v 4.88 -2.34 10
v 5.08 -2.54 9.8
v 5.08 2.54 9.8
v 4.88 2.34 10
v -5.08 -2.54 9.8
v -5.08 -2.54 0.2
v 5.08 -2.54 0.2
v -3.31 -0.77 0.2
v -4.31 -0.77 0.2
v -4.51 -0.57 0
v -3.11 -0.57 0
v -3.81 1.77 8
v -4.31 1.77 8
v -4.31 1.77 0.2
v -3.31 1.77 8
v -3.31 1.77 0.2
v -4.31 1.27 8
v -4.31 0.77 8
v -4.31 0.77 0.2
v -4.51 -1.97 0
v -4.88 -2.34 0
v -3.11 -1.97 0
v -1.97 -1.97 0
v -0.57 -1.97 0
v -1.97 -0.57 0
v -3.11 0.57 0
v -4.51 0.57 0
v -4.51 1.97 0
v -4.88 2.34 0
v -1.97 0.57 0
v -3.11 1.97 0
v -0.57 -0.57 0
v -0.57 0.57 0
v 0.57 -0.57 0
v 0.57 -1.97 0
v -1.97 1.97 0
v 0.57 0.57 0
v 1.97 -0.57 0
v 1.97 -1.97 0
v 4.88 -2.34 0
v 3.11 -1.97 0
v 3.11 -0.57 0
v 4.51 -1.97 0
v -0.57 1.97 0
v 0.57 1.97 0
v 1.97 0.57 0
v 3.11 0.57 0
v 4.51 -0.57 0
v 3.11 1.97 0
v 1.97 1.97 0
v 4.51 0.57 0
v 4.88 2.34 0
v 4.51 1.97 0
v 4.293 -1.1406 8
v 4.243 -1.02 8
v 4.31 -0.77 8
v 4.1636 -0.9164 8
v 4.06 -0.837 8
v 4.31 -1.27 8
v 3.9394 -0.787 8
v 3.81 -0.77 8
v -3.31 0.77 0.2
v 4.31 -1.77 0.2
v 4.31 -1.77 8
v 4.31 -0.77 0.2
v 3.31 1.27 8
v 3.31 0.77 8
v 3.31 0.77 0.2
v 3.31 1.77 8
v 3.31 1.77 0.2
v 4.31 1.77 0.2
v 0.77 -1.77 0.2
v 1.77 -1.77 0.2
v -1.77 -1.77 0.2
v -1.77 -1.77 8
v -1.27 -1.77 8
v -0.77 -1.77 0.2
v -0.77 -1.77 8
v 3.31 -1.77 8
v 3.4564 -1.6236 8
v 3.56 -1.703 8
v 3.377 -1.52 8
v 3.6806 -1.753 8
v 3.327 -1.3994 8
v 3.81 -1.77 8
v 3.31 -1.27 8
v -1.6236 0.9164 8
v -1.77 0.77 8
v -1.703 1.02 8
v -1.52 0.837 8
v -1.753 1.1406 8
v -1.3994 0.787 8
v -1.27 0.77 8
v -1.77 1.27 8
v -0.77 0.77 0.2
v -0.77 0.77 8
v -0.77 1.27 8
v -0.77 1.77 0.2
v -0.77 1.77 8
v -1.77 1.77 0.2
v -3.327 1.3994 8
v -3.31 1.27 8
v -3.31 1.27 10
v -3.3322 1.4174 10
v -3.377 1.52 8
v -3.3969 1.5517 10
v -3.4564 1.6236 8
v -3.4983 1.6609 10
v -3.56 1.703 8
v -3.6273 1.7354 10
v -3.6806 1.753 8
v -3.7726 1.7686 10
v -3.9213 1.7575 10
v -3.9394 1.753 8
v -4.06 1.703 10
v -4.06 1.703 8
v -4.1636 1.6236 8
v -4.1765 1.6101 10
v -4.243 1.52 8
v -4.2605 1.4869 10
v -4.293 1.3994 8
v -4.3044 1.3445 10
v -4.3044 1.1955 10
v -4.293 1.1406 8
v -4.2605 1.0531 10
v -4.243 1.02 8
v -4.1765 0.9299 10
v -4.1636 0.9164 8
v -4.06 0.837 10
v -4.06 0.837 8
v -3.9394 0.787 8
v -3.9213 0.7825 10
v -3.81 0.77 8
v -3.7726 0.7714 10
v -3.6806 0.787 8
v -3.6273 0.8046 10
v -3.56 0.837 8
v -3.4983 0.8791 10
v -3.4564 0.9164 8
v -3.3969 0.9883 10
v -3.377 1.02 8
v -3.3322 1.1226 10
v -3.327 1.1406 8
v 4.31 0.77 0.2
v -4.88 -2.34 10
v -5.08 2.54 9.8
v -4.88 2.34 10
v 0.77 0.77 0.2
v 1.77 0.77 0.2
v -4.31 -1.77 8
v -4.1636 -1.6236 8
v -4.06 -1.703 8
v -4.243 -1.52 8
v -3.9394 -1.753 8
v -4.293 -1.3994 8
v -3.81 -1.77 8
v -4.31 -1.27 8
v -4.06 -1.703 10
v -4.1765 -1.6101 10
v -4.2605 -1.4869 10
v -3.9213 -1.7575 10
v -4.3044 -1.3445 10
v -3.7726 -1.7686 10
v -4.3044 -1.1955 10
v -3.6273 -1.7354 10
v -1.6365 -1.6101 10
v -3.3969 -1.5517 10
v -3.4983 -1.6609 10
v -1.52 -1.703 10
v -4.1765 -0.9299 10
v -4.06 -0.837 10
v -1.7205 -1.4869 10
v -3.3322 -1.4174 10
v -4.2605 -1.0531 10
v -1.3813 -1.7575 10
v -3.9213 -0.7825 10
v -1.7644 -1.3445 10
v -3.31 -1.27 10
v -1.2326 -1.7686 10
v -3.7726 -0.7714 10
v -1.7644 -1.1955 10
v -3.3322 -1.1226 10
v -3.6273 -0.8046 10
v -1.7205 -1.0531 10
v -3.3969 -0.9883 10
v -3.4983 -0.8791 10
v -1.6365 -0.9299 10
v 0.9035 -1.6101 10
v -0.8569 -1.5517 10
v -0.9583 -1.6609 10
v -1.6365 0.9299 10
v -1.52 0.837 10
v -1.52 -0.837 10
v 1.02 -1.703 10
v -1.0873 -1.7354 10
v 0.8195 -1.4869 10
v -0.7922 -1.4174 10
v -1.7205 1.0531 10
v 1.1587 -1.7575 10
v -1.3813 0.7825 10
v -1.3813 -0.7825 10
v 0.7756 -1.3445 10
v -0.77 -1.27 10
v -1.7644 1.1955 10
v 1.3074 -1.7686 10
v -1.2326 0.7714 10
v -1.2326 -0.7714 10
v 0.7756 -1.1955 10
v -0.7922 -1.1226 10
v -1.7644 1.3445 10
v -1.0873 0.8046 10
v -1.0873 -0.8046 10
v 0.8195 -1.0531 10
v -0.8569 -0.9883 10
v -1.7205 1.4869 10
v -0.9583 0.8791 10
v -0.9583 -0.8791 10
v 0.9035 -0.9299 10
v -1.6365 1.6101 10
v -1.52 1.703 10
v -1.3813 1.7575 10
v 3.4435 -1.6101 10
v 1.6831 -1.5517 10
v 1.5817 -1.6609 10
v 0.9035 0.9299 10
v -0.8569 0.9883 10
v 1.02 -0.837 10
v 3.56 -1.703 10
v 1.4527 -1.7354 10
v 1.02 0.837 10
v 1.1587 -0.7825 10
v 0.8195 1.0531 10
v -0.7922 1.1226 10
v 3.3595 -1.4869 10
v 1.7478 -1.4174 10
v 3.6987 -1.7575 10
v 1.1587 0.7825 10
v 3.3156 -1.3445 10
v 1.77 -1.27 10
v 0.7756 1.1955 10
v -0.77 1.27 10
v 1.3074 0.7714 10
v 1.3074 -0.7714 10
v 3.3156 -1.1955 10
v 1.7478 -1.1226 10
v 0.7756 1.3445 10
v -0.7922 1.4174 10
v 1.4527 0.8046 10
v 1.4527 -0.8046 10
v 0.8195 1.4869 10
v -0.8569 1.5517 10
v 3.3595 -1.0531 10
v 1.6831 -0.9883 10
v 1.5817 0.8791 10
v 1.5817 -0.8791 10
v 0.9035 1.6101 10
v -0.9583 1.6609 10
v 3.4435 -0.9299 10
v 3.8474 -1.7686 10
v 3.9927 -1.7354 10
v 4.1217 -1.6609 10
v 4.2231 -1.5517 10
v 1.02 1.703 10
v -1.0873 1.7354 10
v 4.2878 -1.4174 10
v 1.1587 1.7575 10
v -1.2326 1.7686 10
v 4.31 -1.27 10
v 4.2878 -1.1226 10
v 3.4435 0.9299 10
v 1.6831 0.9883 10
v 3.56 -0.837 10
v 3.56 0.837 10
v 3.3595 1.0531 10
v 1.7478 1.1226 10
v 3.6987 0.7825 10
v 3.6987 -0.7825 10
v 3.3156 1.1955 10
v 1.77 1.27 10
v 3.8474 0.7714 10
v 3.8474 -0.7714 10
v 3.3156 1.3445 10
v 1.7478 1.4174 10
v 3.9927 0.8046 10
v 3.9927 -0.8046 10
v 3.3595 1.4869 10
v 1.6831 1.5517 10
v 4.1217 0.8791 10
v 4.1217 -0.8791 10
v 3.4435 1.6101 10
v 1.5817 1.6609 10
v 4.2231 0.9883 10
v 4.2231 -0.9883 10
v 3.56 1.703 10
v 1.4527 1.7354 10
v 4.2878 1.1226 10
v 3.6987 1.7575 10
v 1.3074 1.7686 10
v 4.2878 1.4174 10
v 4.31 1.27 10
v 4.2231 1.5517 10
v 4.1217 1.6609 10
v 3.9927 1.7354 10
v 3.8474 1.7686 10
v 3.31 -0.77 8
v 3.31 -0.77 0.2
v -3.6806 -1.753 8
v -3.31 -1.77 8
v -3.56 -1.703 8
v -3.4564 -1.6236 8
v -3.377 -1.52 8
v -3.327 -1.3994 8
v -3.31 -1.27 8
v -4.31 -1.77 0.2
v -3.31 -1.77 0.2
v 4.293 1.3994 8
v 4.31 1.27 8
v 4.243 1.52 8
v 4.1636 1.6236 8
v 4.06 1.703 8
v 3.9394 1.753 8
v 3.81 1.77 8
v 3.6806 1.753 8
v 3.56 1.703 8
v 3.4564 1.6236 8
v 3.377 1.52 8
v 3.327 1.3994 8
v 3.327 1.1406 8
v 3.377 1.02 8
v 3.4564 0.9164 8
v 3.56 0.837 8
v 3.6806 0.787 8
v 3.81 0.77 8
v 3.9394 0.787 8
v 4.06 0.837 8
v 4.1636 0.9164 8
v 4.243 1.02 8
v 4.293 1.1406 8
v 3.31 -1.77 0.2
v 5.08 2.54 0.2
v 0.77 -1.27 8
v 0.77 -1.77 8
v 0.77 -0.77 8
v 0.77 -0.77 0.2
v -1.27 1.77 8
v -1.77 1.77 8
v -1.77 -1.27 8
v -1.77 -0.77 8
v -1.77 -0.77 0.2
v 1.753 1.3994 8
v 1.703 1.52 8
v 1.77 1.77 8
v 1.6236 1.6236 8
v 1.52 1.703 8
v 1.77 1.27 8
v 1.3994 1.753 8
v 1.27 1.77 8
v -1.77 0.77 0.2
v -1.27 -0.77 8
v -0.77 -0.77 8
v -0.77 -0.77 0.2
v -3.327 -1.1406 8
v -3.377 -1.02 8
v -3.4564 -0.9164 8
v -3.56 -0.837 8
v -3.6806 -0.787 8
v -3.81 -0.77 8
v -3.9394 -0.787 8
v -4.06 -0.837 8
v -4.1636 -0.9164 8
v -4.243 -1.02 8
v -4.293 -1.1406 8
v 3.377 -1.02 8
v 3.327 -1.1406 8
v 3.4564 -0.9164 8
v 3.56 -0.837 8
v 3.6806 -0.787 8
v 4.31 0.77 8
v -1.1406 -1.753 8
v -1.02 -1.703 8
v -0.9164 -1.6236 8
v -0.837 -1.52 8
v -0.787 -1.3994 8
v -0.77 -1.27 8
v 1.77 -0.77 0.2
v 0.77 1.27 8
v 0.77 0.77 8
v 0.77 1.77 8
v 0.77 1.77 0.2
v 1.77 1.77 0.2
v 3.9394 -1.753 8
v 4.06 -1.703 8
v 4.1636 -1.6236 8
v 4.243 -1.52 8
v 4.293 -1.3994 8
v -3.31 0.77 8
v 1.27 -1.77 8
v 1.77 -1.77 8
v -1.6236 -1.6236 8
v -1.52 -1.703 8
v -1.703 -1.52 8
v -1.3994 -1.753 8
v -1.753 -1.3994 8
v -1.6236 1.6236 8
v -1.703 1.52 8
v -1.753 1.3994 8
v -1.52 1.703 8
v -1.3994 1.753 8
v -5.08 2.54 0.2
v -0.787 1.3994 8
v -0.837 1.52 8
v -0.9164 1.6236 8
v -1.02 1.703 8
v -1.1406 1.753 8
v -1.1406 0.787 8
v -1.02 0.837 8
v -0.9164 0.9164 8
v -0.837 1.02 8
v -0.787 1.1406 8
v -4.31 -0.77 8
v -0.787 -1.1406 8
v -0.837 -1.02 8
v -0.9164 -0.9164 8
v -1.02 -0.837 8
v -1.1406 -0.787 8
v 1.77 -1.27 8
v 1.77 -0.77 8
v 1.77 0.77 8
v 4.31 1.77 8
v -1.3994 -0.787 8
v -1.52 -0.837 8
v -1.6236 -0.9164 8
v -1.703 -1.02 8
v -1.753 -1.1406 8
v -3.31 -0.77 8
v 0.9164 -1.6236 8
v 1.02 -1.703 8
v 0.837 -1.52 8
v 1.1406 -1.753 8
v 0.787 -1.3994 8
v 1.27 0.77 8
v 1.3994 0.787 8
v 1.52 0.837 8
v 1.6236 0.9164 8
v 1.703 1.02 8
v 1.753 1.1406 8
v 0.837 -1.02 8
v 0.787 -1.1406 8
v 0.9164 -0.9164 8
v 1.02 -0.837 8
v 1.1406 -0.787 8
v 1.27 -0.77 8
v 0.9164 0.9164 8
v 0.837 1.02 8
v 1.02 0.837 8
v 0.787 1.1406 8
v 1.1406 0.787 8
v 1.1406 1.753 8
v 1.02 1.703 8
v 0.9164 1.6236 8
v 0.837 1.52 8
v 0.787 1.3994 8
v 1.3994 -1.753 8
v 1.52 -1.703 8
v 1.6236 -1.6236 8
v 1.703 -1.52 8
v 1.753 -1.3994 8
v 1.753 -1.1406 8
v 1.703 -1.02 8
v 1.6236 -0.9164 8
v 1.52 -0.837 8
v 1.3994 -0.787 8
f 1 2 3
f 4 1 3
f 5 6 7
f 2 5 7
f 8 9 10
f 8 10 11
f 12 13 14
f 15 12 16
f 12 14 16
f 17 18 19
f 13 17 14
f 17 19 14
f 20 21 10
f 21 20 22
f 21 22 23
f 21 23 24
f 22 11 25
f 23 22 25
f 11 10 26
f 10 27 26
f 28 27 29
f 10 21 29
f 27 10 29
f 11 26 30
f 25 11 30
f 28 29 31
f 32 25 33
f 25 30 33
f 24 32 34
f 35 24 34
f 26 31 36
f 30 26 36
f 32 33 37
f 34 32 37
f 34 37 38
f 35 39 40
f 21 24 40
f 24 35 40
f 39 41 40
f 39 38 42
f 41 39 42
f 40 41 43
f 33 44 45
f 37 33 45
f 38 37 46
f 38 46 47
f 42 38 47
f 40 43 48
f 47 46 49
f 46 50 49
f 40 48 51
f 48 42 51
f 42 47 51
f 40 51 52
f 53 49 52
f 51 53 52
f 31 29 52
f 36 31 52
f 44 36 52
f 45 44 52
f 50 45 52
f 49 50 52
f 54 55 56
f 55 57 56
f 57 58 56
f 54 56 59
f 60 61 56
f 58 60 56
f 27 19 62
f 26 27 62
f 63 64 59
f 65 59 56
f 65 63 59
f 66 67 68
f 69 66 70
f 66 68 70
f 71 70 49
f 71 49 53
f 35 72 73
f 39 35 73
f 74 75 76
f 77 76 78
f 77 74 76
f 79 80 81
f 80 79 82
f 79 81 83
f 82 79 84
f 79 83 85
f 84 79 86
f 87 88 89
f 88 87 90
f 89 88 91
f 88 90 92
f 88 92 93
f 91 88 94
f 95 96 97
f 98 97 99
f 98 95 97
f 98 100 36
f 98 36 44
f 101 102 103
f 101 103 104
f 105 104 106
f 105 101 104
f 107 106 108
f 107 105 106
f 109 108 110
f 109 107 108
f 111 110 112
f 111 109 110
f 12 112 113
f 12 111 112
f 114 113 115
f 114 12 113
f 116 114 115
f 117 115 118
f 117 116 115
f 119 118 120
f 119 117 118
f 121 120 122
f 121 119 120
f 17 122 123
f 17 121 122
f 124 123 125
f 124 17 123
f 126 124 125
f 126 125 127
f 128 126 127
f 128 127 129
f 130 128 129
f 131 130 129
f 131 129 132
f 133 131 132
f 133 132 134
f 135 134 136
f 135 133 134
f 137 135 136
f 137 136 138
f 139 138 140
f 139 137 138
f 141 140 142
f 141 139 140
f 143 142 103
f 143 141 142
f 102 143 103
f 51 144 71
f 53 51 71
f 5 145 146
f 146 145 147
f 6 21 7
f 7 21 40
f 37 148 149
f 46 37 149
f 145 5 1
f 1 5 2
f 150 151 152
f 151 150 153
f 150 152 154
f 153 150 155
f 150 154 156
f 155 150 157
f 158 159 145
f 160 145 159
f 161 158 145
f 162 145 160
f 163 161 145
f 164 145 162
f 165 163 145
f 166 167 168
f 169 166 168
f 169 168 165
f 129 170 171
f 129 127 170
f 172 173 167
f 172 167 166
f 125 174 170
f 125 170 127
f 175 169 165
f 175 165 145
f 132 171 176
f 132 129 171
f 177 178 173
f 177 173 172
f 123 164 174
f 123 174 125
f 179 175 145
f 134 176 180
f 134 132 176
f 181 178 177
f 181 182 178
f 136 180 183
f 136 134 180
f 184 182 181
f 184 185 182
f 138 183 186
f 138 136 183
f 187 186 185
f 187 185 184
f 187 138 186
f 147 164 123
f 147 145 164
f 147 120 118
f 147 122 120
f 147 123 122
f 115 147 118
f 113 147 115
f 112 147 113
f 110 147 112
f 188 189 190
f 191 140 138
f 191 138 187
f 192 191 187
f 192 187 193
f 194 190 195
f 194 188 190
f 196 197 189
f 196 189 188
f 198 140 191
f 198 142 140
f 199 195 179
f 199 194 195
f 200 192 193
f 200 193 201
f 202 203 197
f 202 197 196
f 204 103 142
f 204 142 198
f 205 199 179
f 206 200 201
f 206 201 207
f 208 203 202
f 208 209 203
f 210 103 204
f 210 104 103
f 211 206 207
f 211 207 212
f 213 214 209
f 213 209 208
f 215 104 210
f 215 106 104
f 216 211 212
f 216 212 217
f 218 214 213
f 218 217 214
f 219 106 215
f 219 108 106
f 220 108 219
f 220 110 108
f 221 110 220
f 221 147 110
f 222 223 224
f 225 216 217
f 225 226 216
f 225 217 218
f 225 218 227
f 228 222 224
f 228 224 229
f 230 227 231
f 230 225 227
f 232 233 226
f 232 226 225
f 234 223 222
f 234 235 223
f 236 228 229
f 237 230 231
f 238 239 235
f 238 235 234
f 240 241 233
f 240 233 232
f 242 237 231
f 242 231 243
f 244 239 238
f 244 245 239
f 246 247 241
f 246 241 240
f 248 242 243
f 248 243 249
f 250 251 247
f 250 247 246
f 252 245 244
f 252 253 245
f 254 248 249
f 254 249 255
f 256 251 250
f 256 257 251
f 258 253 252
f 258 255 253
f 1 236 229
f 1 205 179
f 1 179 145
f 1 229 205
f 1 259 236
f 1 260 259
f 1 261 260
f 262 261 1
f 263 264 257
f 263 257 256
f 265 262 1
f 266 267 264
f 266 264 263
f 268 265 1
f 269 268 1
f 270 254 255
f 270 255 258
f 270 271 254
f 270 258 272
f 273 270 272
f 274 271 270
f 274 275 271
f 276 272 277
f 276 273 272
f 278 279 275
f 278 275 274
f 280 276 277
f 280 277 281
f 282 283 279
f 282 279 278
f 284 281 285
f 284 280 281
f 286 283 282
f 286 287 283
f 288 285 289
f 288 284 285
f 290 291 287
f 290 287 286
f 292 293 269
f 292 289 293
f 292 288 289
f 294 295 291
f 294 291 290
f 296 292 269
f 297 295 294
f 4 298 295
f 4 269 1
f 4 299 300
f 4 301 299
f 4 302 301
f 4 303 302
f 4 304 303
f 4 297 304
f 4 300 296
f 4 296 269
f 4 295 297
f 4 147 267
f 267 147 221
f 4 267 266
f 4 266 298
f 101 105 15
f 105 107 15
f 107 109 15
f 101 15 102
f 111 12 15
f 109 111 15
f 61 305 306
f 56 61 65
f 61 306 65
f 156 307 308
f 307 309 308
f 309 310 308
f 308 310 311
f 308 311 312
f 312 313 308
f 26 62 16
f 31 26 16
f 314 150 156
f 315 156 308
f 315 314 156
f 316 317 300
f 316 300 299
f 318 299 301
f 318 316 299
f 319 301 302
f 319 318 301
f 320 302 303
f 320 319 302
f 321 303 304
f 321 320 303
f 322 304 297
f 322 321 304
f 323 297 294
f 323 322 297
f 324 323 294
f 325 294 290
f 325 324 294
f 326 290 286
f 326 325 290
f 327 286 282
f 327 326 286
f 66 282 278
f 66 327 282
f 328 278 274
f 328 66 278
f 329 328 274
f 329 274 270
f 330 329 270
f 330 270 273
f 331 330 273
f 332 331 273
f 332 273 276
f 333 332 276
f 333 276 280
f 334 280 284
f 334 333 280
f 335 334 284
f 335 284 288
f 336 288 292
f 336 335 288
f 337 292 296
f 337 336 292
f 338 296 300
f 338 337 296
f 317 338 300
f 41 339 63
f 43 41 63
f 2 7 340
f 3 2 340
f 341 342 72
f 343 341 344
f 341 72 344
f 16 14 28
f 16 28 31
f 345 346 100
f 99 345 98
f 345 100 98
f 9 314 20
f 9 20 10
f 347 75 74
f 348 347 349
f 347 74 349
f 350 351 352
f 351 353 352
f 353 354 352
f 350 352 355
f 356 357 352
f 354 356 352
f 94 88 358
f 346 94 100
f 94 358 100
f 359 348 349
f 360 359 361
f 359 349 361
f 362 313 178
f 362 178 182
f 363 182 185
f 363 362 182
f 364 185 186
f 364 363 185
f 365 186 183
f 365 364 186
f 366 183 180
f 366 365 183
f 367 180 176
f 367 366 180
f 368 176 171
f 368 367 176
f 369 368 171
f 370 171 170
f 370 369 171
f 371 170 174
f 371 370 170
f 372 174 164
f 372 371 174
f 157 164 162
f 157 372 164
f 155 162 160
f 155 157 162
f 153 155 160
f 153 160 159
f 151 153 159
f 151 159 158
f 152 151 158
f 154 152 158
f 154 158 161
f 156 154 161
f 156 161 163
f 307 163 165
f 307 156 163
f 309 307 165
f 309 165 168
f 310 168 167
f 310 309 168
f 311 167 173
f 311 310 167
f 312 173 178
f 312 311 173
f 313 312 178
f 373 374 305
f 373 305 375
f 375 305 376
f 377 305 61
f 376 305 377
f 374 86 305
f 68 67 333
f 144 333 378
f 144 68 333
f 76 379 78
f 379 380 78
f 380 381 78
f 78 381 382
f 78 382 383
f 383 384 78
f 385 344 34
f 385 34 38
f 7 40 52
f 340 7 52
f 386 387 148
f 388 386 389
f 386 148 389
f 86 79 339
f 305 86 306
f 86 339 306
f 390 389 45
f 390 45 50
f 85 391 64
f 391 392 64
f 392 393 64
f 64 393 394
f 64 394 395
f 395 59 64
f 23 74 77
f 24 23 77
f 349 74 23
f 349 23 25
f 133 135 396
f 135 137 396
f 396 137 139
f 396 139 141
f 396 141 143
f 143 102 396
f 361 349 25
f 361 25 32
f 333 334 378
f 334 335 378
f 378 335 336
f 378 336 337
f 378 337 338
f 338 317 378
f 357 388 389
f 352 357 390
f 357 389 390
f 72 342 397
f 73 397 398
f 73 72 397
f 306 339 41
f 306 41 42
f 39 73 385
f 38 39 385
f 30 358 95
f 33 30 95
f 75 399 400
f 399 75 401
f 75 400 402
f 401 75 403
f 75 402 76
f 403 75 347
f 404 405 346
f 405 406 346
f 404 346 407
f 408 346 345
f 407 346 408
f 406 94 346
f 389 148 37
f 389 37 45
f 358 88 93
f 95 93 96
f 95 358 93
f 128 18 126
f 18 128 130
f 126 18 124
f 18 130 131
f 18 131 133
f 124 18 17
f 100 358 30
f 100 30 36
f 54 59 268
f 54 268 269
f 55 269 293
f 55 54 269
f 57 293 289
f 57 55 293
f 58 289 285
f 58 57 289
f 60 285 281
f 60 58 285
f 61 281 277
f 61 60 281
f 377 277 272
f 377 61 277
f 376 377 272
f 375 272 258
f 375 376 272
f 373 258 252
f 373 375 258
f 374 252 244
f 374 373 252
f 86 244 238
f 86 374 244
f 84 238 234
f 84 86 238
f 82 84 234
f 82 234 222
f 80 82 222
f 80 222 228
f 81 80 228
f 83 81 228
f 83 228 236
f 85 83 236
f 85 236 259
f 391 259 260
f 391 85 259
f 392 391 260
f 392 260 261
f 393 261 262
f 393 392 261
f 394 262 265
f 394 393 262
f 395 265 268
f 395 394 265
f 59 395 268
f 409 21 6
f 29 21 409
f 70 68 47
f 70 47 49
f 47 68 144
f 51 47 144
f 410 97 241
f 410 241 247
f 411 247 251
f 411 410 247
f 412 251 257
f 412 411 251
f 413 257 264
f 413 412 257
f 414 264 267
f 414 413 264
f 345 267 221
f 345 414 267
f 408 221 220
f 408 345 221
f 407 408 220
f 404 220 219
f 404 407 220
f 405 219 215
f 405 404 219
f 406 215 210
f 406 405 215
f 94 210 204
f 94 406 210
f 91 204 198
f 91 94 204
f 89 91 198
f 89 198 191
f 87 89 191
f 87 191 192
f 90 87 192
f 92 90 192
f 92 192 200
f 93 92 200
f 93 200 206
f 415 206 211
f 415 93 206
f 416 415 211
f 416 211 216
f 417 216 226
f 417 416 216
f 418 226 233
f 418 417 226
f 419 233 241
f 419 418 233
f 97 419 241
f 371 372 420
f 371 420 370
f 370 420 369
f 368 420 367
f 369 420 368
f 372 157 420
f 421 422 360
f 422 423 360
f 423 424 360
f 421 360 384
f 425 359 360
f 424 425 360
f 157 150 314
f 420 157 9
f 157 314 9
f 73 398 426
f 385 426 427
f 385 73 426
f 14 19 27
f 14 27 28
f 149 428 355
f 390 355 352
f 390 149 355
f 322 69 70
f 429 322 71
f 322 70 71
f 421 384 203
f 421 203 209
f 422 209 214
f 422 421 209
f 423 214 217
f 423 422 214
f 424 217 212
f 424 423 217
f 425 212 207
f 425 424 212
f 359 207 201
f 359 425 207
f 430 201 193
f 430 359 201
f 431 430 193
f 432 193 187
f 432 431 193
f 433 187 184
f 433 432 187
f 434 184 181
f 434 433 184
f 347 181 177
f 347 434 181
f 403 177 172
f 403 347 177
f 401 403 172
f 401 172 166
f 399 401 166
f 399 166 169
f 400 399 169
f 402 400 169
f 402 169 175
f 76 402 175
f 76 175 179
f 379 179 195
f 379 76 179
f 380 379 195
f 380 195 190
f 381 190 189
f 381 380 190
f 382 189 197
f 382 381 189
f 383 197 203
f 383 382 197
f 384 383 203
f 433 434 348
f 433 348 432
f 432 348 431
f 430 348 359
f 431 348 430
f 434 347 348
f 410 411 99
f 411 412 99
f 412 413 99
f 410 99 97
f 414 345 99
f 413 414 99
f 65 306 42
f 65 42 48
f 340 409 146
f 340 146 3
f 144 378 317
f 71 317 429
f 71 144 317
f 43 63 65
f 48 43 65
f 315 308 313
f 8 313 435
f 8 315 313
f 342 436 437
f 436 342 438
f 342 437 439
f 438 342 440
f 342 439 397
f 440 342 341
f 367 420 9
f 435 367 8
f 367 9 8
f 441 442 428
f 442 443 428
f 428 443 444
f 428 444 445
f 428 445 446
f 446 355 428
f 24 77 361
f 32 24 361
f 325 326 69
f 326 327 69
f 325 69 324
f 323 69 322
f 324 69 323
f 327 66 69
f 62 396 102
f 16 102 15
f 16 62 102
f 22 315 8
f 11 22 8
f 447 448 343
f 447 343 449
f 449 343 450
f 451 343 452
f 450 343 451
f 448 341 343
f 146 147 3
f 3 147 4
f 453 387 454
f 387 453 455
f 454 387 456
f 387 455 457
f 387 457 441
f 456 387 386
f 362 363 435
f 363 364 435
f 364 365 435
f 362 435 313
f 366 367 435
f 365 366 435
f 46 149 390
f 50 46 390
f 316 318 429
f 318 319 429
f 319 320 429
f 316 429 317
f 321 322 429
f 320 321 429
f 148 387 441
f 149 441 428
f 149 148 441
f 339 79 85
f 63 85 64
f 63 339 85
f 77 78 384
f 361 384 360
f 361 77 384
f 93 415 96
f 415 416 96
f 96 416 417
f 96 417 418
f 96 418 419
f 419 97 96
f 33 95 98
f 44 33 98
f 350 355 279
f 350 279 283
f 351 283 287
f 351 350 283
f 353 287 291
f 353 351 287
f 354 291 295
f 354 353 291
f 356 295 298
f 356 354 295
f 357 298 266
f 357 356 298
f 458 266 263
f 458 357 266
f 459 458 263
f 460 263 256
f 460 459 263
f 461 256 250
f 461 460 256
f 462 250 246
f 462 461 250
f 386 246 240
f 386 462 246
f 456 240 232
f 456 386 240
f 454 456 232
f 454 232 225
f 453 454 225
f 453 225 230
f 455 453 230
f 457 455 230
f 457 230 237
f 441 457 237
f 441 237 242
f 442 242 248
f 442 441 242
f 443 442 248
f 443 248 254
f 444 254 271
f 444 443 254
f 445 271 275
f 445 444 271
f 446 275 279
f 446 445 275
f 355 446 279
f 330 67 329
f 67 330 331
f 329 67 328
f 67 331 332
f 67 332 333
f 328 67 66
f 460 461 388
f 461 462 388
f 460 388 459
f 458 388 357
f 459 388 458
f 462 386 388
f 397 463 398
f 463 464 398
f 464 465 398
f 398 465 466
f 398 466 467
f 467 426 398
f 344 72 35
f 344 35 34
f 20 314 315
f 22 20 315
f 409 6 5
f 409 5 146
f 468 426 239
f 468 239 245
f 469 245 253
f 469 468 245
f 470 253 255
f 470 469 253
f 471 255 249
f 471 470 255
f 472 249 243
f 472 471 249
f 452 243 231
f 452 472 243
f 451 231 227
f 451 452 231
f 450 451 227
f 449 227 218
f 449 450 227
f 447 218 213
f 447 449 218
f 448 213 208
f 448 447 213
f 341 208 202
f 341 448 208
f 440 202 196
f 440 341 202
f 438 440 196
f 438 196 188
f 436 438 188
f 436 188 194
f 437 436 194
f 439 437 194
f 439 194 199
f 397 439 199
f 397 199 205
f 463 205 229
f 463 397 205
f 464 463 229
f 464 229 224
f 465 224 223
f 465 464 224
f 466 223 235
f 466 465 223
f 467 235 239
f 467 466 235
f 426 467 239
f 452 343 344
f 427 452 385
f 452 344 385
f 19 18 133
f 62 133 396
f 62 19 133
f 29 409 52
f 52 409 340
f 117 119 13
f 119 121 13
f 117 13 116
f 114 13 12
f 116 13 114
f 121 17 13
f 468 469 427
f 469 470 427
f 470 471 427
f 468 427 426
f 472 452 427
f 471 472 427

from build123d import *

# Parameters (mm, degrees)
SKETCH1_W           = 10.16
SKETCH1_H           = 5.08
SKETCH1_W_2         = 1
SKETCH1_H_2         = 1
BOSS_EXTRUDE2_DEPTH = 8
SKETCH2_W           = 10.16
SKETCH2_H           = 5.08
SKETCH2_R           = 0.5
BOSS_EXTRUDE3_DEPTH = 2
CHAMFER1_SIZE       = 0.2
CHAMFER2_SIZE       = 0.2


with BuildPart() as part:
    # Sketch1 → Boss-Extrude2 (new body)
    with BuildSketch(Plane.XY):
        Rectangle(SKETCH1_W, SKETCH1_H)
        with Locations((-1.27, 1.27)):
            Rectangle(SKETCH1_W_2, SKETCH1_H_2, mode=Mode.SUBTRACT)
        with Locations((-3.81, 1.27)):
            Rectangle(SKETCH1_W_2, SKETCH1_H_2, mode=Mode.SUBTRACT)
        with Locations((1.27, 1.27)):
            Rectangle(SKETCH1_W_2, SKETCH1_H_2, mode=Mode.SUBTRACT)
        with Locations((3.81, 1.27)):
            Rectangle(SKETCH1_W_2, SKETCH1_H_2, mode=Mode.SUBTRACT)
        with Locations((-1.27, -1.27)):
            Rectangle(SKETCH1_W_2, SKETCH1_H_2, mode=Mode.SUBTRACT)
        with Locations((1.27, -1.27)):
            Rectangle(SKETCH1_W_2, SKETCH1_H_2, mode=Mode.SUBTRACT)
        with Locations((3.81, -1.27)):
            Rectangle(SKETCH1_W_2, SKETCH1_H_2, mode=Mode.SUBTRACT)
        with Locations((-3.81, -1.27)):
            Rectangle(SKETCH1_W_2, SKETCH1_H_2, mode=Mode.SUBTRACT)
    extrude(amount=BOSS_EXTRUDE2_DEPTH)

    # Sketch2 → Boss-Extrude3 (add)
    with BuildSketch(Plane.XY.offset(8)):
        Rectangle(SKETCH2_W, SKETCH2_H)
        with Locations((-3.81, 1.27)):
            Circle(SKETCH2_R, mode=Mode.SUBTRACT)
        with Locations((-1.27, 1.27)):
            Circle(SKETCH2_R, mode=Mode.SUBTRACT)
        with Locations((1.27, 1.27)):
            Circle(SKETCH2_R, mode=Mode.SUBTRACT)
        with Locations((3.81, 1.27)):
            Circle(SKETCH2_R, mode=Mode.SUBTRACT)
        with Locations((-1.27, -1.27)):
            Circle(SKETCH2_R, mode=Mode.SUBTRACT)
        with Locations((1.27, -1.27)):
            Circle(SKETCH2_R, mode=Mode.SUBTRACT)
        with Locations((3.81, -1.27)):
            Circle(SKETCH2_R, mode=Mode.SUBTRACT)
        with Locations((-3.81, -1.27)):
            Circle(SKETCH2_R, mode=Mode.SUBTRACT)
    extrude(amount=BOSS_EXTRUDE3_DEPTH)

    # Chamfer1
    chamfer1_edges = [part.edges().sort_by_distance(p)[0] for p in [
        (-4.31, -1.27, 0),
        (-3.81, -1.77, 0),
        (-3.31, -1.27, 0),
        (-3.81, -0.77, 0),
        (-4.31, 1.27, 0),
        (-3.81, 0.77, 0),
        (-3.31, 1.27, 0),
        (-3.81, 1.77, 0),
        (-1.77, 1.27, 0),
        (-1.27, 0.77, 0),
        (-0.77, 1.27, 0),
        (-1.27, 1.77, 0),
        (0.77, 1.27, 0),
        (1.27, 0.77, 0),
        (1.77, 1.27, 0),
        (1.27, 1.77, 0),
        (0, 2.54, 0),
        (5.08, 0, 0),
        (0, -2.54, 0),
        (3.31, 1.27, 0),
        (3.81, 0.77, 0),
        (4.31, 1.27, 0),
        (3.81, 1.77, 0),
        (-5.08, 0, 0),
        (-1.77, -1.27, 0),
        (-1.27, -1.77, 0),
        (-0.77, -1.27, 0),
        (-1.27, -0.77, 0),
        (0.77, -1.27, 0),
        (1.27, -1.77, 0),
        (1.77, -1.27, 0),
        (1.27, -0.77, 0),
        (3.31, -1.27, 0),
        (3.81, -1.77, 0),
        (4.31, -1.27, 0),
        (3.81, -0.77, 0),
    ]]
    chamfer(chamfer1_edges, length=CHAMFER1_SIZE)

    # Chamfer2
    chamfer2_edges = [part.edges().sort_by_distance(p)[0] for p in [
        (-5.08, 0, 10),
        (0, -2.54, 10),
        (5.08, 0, 10),
        (0, 2.54, 10),
    ]]
    chamfer(chamfer2_edges, length=CHAMFER2_SIZE)


solid = part.part
